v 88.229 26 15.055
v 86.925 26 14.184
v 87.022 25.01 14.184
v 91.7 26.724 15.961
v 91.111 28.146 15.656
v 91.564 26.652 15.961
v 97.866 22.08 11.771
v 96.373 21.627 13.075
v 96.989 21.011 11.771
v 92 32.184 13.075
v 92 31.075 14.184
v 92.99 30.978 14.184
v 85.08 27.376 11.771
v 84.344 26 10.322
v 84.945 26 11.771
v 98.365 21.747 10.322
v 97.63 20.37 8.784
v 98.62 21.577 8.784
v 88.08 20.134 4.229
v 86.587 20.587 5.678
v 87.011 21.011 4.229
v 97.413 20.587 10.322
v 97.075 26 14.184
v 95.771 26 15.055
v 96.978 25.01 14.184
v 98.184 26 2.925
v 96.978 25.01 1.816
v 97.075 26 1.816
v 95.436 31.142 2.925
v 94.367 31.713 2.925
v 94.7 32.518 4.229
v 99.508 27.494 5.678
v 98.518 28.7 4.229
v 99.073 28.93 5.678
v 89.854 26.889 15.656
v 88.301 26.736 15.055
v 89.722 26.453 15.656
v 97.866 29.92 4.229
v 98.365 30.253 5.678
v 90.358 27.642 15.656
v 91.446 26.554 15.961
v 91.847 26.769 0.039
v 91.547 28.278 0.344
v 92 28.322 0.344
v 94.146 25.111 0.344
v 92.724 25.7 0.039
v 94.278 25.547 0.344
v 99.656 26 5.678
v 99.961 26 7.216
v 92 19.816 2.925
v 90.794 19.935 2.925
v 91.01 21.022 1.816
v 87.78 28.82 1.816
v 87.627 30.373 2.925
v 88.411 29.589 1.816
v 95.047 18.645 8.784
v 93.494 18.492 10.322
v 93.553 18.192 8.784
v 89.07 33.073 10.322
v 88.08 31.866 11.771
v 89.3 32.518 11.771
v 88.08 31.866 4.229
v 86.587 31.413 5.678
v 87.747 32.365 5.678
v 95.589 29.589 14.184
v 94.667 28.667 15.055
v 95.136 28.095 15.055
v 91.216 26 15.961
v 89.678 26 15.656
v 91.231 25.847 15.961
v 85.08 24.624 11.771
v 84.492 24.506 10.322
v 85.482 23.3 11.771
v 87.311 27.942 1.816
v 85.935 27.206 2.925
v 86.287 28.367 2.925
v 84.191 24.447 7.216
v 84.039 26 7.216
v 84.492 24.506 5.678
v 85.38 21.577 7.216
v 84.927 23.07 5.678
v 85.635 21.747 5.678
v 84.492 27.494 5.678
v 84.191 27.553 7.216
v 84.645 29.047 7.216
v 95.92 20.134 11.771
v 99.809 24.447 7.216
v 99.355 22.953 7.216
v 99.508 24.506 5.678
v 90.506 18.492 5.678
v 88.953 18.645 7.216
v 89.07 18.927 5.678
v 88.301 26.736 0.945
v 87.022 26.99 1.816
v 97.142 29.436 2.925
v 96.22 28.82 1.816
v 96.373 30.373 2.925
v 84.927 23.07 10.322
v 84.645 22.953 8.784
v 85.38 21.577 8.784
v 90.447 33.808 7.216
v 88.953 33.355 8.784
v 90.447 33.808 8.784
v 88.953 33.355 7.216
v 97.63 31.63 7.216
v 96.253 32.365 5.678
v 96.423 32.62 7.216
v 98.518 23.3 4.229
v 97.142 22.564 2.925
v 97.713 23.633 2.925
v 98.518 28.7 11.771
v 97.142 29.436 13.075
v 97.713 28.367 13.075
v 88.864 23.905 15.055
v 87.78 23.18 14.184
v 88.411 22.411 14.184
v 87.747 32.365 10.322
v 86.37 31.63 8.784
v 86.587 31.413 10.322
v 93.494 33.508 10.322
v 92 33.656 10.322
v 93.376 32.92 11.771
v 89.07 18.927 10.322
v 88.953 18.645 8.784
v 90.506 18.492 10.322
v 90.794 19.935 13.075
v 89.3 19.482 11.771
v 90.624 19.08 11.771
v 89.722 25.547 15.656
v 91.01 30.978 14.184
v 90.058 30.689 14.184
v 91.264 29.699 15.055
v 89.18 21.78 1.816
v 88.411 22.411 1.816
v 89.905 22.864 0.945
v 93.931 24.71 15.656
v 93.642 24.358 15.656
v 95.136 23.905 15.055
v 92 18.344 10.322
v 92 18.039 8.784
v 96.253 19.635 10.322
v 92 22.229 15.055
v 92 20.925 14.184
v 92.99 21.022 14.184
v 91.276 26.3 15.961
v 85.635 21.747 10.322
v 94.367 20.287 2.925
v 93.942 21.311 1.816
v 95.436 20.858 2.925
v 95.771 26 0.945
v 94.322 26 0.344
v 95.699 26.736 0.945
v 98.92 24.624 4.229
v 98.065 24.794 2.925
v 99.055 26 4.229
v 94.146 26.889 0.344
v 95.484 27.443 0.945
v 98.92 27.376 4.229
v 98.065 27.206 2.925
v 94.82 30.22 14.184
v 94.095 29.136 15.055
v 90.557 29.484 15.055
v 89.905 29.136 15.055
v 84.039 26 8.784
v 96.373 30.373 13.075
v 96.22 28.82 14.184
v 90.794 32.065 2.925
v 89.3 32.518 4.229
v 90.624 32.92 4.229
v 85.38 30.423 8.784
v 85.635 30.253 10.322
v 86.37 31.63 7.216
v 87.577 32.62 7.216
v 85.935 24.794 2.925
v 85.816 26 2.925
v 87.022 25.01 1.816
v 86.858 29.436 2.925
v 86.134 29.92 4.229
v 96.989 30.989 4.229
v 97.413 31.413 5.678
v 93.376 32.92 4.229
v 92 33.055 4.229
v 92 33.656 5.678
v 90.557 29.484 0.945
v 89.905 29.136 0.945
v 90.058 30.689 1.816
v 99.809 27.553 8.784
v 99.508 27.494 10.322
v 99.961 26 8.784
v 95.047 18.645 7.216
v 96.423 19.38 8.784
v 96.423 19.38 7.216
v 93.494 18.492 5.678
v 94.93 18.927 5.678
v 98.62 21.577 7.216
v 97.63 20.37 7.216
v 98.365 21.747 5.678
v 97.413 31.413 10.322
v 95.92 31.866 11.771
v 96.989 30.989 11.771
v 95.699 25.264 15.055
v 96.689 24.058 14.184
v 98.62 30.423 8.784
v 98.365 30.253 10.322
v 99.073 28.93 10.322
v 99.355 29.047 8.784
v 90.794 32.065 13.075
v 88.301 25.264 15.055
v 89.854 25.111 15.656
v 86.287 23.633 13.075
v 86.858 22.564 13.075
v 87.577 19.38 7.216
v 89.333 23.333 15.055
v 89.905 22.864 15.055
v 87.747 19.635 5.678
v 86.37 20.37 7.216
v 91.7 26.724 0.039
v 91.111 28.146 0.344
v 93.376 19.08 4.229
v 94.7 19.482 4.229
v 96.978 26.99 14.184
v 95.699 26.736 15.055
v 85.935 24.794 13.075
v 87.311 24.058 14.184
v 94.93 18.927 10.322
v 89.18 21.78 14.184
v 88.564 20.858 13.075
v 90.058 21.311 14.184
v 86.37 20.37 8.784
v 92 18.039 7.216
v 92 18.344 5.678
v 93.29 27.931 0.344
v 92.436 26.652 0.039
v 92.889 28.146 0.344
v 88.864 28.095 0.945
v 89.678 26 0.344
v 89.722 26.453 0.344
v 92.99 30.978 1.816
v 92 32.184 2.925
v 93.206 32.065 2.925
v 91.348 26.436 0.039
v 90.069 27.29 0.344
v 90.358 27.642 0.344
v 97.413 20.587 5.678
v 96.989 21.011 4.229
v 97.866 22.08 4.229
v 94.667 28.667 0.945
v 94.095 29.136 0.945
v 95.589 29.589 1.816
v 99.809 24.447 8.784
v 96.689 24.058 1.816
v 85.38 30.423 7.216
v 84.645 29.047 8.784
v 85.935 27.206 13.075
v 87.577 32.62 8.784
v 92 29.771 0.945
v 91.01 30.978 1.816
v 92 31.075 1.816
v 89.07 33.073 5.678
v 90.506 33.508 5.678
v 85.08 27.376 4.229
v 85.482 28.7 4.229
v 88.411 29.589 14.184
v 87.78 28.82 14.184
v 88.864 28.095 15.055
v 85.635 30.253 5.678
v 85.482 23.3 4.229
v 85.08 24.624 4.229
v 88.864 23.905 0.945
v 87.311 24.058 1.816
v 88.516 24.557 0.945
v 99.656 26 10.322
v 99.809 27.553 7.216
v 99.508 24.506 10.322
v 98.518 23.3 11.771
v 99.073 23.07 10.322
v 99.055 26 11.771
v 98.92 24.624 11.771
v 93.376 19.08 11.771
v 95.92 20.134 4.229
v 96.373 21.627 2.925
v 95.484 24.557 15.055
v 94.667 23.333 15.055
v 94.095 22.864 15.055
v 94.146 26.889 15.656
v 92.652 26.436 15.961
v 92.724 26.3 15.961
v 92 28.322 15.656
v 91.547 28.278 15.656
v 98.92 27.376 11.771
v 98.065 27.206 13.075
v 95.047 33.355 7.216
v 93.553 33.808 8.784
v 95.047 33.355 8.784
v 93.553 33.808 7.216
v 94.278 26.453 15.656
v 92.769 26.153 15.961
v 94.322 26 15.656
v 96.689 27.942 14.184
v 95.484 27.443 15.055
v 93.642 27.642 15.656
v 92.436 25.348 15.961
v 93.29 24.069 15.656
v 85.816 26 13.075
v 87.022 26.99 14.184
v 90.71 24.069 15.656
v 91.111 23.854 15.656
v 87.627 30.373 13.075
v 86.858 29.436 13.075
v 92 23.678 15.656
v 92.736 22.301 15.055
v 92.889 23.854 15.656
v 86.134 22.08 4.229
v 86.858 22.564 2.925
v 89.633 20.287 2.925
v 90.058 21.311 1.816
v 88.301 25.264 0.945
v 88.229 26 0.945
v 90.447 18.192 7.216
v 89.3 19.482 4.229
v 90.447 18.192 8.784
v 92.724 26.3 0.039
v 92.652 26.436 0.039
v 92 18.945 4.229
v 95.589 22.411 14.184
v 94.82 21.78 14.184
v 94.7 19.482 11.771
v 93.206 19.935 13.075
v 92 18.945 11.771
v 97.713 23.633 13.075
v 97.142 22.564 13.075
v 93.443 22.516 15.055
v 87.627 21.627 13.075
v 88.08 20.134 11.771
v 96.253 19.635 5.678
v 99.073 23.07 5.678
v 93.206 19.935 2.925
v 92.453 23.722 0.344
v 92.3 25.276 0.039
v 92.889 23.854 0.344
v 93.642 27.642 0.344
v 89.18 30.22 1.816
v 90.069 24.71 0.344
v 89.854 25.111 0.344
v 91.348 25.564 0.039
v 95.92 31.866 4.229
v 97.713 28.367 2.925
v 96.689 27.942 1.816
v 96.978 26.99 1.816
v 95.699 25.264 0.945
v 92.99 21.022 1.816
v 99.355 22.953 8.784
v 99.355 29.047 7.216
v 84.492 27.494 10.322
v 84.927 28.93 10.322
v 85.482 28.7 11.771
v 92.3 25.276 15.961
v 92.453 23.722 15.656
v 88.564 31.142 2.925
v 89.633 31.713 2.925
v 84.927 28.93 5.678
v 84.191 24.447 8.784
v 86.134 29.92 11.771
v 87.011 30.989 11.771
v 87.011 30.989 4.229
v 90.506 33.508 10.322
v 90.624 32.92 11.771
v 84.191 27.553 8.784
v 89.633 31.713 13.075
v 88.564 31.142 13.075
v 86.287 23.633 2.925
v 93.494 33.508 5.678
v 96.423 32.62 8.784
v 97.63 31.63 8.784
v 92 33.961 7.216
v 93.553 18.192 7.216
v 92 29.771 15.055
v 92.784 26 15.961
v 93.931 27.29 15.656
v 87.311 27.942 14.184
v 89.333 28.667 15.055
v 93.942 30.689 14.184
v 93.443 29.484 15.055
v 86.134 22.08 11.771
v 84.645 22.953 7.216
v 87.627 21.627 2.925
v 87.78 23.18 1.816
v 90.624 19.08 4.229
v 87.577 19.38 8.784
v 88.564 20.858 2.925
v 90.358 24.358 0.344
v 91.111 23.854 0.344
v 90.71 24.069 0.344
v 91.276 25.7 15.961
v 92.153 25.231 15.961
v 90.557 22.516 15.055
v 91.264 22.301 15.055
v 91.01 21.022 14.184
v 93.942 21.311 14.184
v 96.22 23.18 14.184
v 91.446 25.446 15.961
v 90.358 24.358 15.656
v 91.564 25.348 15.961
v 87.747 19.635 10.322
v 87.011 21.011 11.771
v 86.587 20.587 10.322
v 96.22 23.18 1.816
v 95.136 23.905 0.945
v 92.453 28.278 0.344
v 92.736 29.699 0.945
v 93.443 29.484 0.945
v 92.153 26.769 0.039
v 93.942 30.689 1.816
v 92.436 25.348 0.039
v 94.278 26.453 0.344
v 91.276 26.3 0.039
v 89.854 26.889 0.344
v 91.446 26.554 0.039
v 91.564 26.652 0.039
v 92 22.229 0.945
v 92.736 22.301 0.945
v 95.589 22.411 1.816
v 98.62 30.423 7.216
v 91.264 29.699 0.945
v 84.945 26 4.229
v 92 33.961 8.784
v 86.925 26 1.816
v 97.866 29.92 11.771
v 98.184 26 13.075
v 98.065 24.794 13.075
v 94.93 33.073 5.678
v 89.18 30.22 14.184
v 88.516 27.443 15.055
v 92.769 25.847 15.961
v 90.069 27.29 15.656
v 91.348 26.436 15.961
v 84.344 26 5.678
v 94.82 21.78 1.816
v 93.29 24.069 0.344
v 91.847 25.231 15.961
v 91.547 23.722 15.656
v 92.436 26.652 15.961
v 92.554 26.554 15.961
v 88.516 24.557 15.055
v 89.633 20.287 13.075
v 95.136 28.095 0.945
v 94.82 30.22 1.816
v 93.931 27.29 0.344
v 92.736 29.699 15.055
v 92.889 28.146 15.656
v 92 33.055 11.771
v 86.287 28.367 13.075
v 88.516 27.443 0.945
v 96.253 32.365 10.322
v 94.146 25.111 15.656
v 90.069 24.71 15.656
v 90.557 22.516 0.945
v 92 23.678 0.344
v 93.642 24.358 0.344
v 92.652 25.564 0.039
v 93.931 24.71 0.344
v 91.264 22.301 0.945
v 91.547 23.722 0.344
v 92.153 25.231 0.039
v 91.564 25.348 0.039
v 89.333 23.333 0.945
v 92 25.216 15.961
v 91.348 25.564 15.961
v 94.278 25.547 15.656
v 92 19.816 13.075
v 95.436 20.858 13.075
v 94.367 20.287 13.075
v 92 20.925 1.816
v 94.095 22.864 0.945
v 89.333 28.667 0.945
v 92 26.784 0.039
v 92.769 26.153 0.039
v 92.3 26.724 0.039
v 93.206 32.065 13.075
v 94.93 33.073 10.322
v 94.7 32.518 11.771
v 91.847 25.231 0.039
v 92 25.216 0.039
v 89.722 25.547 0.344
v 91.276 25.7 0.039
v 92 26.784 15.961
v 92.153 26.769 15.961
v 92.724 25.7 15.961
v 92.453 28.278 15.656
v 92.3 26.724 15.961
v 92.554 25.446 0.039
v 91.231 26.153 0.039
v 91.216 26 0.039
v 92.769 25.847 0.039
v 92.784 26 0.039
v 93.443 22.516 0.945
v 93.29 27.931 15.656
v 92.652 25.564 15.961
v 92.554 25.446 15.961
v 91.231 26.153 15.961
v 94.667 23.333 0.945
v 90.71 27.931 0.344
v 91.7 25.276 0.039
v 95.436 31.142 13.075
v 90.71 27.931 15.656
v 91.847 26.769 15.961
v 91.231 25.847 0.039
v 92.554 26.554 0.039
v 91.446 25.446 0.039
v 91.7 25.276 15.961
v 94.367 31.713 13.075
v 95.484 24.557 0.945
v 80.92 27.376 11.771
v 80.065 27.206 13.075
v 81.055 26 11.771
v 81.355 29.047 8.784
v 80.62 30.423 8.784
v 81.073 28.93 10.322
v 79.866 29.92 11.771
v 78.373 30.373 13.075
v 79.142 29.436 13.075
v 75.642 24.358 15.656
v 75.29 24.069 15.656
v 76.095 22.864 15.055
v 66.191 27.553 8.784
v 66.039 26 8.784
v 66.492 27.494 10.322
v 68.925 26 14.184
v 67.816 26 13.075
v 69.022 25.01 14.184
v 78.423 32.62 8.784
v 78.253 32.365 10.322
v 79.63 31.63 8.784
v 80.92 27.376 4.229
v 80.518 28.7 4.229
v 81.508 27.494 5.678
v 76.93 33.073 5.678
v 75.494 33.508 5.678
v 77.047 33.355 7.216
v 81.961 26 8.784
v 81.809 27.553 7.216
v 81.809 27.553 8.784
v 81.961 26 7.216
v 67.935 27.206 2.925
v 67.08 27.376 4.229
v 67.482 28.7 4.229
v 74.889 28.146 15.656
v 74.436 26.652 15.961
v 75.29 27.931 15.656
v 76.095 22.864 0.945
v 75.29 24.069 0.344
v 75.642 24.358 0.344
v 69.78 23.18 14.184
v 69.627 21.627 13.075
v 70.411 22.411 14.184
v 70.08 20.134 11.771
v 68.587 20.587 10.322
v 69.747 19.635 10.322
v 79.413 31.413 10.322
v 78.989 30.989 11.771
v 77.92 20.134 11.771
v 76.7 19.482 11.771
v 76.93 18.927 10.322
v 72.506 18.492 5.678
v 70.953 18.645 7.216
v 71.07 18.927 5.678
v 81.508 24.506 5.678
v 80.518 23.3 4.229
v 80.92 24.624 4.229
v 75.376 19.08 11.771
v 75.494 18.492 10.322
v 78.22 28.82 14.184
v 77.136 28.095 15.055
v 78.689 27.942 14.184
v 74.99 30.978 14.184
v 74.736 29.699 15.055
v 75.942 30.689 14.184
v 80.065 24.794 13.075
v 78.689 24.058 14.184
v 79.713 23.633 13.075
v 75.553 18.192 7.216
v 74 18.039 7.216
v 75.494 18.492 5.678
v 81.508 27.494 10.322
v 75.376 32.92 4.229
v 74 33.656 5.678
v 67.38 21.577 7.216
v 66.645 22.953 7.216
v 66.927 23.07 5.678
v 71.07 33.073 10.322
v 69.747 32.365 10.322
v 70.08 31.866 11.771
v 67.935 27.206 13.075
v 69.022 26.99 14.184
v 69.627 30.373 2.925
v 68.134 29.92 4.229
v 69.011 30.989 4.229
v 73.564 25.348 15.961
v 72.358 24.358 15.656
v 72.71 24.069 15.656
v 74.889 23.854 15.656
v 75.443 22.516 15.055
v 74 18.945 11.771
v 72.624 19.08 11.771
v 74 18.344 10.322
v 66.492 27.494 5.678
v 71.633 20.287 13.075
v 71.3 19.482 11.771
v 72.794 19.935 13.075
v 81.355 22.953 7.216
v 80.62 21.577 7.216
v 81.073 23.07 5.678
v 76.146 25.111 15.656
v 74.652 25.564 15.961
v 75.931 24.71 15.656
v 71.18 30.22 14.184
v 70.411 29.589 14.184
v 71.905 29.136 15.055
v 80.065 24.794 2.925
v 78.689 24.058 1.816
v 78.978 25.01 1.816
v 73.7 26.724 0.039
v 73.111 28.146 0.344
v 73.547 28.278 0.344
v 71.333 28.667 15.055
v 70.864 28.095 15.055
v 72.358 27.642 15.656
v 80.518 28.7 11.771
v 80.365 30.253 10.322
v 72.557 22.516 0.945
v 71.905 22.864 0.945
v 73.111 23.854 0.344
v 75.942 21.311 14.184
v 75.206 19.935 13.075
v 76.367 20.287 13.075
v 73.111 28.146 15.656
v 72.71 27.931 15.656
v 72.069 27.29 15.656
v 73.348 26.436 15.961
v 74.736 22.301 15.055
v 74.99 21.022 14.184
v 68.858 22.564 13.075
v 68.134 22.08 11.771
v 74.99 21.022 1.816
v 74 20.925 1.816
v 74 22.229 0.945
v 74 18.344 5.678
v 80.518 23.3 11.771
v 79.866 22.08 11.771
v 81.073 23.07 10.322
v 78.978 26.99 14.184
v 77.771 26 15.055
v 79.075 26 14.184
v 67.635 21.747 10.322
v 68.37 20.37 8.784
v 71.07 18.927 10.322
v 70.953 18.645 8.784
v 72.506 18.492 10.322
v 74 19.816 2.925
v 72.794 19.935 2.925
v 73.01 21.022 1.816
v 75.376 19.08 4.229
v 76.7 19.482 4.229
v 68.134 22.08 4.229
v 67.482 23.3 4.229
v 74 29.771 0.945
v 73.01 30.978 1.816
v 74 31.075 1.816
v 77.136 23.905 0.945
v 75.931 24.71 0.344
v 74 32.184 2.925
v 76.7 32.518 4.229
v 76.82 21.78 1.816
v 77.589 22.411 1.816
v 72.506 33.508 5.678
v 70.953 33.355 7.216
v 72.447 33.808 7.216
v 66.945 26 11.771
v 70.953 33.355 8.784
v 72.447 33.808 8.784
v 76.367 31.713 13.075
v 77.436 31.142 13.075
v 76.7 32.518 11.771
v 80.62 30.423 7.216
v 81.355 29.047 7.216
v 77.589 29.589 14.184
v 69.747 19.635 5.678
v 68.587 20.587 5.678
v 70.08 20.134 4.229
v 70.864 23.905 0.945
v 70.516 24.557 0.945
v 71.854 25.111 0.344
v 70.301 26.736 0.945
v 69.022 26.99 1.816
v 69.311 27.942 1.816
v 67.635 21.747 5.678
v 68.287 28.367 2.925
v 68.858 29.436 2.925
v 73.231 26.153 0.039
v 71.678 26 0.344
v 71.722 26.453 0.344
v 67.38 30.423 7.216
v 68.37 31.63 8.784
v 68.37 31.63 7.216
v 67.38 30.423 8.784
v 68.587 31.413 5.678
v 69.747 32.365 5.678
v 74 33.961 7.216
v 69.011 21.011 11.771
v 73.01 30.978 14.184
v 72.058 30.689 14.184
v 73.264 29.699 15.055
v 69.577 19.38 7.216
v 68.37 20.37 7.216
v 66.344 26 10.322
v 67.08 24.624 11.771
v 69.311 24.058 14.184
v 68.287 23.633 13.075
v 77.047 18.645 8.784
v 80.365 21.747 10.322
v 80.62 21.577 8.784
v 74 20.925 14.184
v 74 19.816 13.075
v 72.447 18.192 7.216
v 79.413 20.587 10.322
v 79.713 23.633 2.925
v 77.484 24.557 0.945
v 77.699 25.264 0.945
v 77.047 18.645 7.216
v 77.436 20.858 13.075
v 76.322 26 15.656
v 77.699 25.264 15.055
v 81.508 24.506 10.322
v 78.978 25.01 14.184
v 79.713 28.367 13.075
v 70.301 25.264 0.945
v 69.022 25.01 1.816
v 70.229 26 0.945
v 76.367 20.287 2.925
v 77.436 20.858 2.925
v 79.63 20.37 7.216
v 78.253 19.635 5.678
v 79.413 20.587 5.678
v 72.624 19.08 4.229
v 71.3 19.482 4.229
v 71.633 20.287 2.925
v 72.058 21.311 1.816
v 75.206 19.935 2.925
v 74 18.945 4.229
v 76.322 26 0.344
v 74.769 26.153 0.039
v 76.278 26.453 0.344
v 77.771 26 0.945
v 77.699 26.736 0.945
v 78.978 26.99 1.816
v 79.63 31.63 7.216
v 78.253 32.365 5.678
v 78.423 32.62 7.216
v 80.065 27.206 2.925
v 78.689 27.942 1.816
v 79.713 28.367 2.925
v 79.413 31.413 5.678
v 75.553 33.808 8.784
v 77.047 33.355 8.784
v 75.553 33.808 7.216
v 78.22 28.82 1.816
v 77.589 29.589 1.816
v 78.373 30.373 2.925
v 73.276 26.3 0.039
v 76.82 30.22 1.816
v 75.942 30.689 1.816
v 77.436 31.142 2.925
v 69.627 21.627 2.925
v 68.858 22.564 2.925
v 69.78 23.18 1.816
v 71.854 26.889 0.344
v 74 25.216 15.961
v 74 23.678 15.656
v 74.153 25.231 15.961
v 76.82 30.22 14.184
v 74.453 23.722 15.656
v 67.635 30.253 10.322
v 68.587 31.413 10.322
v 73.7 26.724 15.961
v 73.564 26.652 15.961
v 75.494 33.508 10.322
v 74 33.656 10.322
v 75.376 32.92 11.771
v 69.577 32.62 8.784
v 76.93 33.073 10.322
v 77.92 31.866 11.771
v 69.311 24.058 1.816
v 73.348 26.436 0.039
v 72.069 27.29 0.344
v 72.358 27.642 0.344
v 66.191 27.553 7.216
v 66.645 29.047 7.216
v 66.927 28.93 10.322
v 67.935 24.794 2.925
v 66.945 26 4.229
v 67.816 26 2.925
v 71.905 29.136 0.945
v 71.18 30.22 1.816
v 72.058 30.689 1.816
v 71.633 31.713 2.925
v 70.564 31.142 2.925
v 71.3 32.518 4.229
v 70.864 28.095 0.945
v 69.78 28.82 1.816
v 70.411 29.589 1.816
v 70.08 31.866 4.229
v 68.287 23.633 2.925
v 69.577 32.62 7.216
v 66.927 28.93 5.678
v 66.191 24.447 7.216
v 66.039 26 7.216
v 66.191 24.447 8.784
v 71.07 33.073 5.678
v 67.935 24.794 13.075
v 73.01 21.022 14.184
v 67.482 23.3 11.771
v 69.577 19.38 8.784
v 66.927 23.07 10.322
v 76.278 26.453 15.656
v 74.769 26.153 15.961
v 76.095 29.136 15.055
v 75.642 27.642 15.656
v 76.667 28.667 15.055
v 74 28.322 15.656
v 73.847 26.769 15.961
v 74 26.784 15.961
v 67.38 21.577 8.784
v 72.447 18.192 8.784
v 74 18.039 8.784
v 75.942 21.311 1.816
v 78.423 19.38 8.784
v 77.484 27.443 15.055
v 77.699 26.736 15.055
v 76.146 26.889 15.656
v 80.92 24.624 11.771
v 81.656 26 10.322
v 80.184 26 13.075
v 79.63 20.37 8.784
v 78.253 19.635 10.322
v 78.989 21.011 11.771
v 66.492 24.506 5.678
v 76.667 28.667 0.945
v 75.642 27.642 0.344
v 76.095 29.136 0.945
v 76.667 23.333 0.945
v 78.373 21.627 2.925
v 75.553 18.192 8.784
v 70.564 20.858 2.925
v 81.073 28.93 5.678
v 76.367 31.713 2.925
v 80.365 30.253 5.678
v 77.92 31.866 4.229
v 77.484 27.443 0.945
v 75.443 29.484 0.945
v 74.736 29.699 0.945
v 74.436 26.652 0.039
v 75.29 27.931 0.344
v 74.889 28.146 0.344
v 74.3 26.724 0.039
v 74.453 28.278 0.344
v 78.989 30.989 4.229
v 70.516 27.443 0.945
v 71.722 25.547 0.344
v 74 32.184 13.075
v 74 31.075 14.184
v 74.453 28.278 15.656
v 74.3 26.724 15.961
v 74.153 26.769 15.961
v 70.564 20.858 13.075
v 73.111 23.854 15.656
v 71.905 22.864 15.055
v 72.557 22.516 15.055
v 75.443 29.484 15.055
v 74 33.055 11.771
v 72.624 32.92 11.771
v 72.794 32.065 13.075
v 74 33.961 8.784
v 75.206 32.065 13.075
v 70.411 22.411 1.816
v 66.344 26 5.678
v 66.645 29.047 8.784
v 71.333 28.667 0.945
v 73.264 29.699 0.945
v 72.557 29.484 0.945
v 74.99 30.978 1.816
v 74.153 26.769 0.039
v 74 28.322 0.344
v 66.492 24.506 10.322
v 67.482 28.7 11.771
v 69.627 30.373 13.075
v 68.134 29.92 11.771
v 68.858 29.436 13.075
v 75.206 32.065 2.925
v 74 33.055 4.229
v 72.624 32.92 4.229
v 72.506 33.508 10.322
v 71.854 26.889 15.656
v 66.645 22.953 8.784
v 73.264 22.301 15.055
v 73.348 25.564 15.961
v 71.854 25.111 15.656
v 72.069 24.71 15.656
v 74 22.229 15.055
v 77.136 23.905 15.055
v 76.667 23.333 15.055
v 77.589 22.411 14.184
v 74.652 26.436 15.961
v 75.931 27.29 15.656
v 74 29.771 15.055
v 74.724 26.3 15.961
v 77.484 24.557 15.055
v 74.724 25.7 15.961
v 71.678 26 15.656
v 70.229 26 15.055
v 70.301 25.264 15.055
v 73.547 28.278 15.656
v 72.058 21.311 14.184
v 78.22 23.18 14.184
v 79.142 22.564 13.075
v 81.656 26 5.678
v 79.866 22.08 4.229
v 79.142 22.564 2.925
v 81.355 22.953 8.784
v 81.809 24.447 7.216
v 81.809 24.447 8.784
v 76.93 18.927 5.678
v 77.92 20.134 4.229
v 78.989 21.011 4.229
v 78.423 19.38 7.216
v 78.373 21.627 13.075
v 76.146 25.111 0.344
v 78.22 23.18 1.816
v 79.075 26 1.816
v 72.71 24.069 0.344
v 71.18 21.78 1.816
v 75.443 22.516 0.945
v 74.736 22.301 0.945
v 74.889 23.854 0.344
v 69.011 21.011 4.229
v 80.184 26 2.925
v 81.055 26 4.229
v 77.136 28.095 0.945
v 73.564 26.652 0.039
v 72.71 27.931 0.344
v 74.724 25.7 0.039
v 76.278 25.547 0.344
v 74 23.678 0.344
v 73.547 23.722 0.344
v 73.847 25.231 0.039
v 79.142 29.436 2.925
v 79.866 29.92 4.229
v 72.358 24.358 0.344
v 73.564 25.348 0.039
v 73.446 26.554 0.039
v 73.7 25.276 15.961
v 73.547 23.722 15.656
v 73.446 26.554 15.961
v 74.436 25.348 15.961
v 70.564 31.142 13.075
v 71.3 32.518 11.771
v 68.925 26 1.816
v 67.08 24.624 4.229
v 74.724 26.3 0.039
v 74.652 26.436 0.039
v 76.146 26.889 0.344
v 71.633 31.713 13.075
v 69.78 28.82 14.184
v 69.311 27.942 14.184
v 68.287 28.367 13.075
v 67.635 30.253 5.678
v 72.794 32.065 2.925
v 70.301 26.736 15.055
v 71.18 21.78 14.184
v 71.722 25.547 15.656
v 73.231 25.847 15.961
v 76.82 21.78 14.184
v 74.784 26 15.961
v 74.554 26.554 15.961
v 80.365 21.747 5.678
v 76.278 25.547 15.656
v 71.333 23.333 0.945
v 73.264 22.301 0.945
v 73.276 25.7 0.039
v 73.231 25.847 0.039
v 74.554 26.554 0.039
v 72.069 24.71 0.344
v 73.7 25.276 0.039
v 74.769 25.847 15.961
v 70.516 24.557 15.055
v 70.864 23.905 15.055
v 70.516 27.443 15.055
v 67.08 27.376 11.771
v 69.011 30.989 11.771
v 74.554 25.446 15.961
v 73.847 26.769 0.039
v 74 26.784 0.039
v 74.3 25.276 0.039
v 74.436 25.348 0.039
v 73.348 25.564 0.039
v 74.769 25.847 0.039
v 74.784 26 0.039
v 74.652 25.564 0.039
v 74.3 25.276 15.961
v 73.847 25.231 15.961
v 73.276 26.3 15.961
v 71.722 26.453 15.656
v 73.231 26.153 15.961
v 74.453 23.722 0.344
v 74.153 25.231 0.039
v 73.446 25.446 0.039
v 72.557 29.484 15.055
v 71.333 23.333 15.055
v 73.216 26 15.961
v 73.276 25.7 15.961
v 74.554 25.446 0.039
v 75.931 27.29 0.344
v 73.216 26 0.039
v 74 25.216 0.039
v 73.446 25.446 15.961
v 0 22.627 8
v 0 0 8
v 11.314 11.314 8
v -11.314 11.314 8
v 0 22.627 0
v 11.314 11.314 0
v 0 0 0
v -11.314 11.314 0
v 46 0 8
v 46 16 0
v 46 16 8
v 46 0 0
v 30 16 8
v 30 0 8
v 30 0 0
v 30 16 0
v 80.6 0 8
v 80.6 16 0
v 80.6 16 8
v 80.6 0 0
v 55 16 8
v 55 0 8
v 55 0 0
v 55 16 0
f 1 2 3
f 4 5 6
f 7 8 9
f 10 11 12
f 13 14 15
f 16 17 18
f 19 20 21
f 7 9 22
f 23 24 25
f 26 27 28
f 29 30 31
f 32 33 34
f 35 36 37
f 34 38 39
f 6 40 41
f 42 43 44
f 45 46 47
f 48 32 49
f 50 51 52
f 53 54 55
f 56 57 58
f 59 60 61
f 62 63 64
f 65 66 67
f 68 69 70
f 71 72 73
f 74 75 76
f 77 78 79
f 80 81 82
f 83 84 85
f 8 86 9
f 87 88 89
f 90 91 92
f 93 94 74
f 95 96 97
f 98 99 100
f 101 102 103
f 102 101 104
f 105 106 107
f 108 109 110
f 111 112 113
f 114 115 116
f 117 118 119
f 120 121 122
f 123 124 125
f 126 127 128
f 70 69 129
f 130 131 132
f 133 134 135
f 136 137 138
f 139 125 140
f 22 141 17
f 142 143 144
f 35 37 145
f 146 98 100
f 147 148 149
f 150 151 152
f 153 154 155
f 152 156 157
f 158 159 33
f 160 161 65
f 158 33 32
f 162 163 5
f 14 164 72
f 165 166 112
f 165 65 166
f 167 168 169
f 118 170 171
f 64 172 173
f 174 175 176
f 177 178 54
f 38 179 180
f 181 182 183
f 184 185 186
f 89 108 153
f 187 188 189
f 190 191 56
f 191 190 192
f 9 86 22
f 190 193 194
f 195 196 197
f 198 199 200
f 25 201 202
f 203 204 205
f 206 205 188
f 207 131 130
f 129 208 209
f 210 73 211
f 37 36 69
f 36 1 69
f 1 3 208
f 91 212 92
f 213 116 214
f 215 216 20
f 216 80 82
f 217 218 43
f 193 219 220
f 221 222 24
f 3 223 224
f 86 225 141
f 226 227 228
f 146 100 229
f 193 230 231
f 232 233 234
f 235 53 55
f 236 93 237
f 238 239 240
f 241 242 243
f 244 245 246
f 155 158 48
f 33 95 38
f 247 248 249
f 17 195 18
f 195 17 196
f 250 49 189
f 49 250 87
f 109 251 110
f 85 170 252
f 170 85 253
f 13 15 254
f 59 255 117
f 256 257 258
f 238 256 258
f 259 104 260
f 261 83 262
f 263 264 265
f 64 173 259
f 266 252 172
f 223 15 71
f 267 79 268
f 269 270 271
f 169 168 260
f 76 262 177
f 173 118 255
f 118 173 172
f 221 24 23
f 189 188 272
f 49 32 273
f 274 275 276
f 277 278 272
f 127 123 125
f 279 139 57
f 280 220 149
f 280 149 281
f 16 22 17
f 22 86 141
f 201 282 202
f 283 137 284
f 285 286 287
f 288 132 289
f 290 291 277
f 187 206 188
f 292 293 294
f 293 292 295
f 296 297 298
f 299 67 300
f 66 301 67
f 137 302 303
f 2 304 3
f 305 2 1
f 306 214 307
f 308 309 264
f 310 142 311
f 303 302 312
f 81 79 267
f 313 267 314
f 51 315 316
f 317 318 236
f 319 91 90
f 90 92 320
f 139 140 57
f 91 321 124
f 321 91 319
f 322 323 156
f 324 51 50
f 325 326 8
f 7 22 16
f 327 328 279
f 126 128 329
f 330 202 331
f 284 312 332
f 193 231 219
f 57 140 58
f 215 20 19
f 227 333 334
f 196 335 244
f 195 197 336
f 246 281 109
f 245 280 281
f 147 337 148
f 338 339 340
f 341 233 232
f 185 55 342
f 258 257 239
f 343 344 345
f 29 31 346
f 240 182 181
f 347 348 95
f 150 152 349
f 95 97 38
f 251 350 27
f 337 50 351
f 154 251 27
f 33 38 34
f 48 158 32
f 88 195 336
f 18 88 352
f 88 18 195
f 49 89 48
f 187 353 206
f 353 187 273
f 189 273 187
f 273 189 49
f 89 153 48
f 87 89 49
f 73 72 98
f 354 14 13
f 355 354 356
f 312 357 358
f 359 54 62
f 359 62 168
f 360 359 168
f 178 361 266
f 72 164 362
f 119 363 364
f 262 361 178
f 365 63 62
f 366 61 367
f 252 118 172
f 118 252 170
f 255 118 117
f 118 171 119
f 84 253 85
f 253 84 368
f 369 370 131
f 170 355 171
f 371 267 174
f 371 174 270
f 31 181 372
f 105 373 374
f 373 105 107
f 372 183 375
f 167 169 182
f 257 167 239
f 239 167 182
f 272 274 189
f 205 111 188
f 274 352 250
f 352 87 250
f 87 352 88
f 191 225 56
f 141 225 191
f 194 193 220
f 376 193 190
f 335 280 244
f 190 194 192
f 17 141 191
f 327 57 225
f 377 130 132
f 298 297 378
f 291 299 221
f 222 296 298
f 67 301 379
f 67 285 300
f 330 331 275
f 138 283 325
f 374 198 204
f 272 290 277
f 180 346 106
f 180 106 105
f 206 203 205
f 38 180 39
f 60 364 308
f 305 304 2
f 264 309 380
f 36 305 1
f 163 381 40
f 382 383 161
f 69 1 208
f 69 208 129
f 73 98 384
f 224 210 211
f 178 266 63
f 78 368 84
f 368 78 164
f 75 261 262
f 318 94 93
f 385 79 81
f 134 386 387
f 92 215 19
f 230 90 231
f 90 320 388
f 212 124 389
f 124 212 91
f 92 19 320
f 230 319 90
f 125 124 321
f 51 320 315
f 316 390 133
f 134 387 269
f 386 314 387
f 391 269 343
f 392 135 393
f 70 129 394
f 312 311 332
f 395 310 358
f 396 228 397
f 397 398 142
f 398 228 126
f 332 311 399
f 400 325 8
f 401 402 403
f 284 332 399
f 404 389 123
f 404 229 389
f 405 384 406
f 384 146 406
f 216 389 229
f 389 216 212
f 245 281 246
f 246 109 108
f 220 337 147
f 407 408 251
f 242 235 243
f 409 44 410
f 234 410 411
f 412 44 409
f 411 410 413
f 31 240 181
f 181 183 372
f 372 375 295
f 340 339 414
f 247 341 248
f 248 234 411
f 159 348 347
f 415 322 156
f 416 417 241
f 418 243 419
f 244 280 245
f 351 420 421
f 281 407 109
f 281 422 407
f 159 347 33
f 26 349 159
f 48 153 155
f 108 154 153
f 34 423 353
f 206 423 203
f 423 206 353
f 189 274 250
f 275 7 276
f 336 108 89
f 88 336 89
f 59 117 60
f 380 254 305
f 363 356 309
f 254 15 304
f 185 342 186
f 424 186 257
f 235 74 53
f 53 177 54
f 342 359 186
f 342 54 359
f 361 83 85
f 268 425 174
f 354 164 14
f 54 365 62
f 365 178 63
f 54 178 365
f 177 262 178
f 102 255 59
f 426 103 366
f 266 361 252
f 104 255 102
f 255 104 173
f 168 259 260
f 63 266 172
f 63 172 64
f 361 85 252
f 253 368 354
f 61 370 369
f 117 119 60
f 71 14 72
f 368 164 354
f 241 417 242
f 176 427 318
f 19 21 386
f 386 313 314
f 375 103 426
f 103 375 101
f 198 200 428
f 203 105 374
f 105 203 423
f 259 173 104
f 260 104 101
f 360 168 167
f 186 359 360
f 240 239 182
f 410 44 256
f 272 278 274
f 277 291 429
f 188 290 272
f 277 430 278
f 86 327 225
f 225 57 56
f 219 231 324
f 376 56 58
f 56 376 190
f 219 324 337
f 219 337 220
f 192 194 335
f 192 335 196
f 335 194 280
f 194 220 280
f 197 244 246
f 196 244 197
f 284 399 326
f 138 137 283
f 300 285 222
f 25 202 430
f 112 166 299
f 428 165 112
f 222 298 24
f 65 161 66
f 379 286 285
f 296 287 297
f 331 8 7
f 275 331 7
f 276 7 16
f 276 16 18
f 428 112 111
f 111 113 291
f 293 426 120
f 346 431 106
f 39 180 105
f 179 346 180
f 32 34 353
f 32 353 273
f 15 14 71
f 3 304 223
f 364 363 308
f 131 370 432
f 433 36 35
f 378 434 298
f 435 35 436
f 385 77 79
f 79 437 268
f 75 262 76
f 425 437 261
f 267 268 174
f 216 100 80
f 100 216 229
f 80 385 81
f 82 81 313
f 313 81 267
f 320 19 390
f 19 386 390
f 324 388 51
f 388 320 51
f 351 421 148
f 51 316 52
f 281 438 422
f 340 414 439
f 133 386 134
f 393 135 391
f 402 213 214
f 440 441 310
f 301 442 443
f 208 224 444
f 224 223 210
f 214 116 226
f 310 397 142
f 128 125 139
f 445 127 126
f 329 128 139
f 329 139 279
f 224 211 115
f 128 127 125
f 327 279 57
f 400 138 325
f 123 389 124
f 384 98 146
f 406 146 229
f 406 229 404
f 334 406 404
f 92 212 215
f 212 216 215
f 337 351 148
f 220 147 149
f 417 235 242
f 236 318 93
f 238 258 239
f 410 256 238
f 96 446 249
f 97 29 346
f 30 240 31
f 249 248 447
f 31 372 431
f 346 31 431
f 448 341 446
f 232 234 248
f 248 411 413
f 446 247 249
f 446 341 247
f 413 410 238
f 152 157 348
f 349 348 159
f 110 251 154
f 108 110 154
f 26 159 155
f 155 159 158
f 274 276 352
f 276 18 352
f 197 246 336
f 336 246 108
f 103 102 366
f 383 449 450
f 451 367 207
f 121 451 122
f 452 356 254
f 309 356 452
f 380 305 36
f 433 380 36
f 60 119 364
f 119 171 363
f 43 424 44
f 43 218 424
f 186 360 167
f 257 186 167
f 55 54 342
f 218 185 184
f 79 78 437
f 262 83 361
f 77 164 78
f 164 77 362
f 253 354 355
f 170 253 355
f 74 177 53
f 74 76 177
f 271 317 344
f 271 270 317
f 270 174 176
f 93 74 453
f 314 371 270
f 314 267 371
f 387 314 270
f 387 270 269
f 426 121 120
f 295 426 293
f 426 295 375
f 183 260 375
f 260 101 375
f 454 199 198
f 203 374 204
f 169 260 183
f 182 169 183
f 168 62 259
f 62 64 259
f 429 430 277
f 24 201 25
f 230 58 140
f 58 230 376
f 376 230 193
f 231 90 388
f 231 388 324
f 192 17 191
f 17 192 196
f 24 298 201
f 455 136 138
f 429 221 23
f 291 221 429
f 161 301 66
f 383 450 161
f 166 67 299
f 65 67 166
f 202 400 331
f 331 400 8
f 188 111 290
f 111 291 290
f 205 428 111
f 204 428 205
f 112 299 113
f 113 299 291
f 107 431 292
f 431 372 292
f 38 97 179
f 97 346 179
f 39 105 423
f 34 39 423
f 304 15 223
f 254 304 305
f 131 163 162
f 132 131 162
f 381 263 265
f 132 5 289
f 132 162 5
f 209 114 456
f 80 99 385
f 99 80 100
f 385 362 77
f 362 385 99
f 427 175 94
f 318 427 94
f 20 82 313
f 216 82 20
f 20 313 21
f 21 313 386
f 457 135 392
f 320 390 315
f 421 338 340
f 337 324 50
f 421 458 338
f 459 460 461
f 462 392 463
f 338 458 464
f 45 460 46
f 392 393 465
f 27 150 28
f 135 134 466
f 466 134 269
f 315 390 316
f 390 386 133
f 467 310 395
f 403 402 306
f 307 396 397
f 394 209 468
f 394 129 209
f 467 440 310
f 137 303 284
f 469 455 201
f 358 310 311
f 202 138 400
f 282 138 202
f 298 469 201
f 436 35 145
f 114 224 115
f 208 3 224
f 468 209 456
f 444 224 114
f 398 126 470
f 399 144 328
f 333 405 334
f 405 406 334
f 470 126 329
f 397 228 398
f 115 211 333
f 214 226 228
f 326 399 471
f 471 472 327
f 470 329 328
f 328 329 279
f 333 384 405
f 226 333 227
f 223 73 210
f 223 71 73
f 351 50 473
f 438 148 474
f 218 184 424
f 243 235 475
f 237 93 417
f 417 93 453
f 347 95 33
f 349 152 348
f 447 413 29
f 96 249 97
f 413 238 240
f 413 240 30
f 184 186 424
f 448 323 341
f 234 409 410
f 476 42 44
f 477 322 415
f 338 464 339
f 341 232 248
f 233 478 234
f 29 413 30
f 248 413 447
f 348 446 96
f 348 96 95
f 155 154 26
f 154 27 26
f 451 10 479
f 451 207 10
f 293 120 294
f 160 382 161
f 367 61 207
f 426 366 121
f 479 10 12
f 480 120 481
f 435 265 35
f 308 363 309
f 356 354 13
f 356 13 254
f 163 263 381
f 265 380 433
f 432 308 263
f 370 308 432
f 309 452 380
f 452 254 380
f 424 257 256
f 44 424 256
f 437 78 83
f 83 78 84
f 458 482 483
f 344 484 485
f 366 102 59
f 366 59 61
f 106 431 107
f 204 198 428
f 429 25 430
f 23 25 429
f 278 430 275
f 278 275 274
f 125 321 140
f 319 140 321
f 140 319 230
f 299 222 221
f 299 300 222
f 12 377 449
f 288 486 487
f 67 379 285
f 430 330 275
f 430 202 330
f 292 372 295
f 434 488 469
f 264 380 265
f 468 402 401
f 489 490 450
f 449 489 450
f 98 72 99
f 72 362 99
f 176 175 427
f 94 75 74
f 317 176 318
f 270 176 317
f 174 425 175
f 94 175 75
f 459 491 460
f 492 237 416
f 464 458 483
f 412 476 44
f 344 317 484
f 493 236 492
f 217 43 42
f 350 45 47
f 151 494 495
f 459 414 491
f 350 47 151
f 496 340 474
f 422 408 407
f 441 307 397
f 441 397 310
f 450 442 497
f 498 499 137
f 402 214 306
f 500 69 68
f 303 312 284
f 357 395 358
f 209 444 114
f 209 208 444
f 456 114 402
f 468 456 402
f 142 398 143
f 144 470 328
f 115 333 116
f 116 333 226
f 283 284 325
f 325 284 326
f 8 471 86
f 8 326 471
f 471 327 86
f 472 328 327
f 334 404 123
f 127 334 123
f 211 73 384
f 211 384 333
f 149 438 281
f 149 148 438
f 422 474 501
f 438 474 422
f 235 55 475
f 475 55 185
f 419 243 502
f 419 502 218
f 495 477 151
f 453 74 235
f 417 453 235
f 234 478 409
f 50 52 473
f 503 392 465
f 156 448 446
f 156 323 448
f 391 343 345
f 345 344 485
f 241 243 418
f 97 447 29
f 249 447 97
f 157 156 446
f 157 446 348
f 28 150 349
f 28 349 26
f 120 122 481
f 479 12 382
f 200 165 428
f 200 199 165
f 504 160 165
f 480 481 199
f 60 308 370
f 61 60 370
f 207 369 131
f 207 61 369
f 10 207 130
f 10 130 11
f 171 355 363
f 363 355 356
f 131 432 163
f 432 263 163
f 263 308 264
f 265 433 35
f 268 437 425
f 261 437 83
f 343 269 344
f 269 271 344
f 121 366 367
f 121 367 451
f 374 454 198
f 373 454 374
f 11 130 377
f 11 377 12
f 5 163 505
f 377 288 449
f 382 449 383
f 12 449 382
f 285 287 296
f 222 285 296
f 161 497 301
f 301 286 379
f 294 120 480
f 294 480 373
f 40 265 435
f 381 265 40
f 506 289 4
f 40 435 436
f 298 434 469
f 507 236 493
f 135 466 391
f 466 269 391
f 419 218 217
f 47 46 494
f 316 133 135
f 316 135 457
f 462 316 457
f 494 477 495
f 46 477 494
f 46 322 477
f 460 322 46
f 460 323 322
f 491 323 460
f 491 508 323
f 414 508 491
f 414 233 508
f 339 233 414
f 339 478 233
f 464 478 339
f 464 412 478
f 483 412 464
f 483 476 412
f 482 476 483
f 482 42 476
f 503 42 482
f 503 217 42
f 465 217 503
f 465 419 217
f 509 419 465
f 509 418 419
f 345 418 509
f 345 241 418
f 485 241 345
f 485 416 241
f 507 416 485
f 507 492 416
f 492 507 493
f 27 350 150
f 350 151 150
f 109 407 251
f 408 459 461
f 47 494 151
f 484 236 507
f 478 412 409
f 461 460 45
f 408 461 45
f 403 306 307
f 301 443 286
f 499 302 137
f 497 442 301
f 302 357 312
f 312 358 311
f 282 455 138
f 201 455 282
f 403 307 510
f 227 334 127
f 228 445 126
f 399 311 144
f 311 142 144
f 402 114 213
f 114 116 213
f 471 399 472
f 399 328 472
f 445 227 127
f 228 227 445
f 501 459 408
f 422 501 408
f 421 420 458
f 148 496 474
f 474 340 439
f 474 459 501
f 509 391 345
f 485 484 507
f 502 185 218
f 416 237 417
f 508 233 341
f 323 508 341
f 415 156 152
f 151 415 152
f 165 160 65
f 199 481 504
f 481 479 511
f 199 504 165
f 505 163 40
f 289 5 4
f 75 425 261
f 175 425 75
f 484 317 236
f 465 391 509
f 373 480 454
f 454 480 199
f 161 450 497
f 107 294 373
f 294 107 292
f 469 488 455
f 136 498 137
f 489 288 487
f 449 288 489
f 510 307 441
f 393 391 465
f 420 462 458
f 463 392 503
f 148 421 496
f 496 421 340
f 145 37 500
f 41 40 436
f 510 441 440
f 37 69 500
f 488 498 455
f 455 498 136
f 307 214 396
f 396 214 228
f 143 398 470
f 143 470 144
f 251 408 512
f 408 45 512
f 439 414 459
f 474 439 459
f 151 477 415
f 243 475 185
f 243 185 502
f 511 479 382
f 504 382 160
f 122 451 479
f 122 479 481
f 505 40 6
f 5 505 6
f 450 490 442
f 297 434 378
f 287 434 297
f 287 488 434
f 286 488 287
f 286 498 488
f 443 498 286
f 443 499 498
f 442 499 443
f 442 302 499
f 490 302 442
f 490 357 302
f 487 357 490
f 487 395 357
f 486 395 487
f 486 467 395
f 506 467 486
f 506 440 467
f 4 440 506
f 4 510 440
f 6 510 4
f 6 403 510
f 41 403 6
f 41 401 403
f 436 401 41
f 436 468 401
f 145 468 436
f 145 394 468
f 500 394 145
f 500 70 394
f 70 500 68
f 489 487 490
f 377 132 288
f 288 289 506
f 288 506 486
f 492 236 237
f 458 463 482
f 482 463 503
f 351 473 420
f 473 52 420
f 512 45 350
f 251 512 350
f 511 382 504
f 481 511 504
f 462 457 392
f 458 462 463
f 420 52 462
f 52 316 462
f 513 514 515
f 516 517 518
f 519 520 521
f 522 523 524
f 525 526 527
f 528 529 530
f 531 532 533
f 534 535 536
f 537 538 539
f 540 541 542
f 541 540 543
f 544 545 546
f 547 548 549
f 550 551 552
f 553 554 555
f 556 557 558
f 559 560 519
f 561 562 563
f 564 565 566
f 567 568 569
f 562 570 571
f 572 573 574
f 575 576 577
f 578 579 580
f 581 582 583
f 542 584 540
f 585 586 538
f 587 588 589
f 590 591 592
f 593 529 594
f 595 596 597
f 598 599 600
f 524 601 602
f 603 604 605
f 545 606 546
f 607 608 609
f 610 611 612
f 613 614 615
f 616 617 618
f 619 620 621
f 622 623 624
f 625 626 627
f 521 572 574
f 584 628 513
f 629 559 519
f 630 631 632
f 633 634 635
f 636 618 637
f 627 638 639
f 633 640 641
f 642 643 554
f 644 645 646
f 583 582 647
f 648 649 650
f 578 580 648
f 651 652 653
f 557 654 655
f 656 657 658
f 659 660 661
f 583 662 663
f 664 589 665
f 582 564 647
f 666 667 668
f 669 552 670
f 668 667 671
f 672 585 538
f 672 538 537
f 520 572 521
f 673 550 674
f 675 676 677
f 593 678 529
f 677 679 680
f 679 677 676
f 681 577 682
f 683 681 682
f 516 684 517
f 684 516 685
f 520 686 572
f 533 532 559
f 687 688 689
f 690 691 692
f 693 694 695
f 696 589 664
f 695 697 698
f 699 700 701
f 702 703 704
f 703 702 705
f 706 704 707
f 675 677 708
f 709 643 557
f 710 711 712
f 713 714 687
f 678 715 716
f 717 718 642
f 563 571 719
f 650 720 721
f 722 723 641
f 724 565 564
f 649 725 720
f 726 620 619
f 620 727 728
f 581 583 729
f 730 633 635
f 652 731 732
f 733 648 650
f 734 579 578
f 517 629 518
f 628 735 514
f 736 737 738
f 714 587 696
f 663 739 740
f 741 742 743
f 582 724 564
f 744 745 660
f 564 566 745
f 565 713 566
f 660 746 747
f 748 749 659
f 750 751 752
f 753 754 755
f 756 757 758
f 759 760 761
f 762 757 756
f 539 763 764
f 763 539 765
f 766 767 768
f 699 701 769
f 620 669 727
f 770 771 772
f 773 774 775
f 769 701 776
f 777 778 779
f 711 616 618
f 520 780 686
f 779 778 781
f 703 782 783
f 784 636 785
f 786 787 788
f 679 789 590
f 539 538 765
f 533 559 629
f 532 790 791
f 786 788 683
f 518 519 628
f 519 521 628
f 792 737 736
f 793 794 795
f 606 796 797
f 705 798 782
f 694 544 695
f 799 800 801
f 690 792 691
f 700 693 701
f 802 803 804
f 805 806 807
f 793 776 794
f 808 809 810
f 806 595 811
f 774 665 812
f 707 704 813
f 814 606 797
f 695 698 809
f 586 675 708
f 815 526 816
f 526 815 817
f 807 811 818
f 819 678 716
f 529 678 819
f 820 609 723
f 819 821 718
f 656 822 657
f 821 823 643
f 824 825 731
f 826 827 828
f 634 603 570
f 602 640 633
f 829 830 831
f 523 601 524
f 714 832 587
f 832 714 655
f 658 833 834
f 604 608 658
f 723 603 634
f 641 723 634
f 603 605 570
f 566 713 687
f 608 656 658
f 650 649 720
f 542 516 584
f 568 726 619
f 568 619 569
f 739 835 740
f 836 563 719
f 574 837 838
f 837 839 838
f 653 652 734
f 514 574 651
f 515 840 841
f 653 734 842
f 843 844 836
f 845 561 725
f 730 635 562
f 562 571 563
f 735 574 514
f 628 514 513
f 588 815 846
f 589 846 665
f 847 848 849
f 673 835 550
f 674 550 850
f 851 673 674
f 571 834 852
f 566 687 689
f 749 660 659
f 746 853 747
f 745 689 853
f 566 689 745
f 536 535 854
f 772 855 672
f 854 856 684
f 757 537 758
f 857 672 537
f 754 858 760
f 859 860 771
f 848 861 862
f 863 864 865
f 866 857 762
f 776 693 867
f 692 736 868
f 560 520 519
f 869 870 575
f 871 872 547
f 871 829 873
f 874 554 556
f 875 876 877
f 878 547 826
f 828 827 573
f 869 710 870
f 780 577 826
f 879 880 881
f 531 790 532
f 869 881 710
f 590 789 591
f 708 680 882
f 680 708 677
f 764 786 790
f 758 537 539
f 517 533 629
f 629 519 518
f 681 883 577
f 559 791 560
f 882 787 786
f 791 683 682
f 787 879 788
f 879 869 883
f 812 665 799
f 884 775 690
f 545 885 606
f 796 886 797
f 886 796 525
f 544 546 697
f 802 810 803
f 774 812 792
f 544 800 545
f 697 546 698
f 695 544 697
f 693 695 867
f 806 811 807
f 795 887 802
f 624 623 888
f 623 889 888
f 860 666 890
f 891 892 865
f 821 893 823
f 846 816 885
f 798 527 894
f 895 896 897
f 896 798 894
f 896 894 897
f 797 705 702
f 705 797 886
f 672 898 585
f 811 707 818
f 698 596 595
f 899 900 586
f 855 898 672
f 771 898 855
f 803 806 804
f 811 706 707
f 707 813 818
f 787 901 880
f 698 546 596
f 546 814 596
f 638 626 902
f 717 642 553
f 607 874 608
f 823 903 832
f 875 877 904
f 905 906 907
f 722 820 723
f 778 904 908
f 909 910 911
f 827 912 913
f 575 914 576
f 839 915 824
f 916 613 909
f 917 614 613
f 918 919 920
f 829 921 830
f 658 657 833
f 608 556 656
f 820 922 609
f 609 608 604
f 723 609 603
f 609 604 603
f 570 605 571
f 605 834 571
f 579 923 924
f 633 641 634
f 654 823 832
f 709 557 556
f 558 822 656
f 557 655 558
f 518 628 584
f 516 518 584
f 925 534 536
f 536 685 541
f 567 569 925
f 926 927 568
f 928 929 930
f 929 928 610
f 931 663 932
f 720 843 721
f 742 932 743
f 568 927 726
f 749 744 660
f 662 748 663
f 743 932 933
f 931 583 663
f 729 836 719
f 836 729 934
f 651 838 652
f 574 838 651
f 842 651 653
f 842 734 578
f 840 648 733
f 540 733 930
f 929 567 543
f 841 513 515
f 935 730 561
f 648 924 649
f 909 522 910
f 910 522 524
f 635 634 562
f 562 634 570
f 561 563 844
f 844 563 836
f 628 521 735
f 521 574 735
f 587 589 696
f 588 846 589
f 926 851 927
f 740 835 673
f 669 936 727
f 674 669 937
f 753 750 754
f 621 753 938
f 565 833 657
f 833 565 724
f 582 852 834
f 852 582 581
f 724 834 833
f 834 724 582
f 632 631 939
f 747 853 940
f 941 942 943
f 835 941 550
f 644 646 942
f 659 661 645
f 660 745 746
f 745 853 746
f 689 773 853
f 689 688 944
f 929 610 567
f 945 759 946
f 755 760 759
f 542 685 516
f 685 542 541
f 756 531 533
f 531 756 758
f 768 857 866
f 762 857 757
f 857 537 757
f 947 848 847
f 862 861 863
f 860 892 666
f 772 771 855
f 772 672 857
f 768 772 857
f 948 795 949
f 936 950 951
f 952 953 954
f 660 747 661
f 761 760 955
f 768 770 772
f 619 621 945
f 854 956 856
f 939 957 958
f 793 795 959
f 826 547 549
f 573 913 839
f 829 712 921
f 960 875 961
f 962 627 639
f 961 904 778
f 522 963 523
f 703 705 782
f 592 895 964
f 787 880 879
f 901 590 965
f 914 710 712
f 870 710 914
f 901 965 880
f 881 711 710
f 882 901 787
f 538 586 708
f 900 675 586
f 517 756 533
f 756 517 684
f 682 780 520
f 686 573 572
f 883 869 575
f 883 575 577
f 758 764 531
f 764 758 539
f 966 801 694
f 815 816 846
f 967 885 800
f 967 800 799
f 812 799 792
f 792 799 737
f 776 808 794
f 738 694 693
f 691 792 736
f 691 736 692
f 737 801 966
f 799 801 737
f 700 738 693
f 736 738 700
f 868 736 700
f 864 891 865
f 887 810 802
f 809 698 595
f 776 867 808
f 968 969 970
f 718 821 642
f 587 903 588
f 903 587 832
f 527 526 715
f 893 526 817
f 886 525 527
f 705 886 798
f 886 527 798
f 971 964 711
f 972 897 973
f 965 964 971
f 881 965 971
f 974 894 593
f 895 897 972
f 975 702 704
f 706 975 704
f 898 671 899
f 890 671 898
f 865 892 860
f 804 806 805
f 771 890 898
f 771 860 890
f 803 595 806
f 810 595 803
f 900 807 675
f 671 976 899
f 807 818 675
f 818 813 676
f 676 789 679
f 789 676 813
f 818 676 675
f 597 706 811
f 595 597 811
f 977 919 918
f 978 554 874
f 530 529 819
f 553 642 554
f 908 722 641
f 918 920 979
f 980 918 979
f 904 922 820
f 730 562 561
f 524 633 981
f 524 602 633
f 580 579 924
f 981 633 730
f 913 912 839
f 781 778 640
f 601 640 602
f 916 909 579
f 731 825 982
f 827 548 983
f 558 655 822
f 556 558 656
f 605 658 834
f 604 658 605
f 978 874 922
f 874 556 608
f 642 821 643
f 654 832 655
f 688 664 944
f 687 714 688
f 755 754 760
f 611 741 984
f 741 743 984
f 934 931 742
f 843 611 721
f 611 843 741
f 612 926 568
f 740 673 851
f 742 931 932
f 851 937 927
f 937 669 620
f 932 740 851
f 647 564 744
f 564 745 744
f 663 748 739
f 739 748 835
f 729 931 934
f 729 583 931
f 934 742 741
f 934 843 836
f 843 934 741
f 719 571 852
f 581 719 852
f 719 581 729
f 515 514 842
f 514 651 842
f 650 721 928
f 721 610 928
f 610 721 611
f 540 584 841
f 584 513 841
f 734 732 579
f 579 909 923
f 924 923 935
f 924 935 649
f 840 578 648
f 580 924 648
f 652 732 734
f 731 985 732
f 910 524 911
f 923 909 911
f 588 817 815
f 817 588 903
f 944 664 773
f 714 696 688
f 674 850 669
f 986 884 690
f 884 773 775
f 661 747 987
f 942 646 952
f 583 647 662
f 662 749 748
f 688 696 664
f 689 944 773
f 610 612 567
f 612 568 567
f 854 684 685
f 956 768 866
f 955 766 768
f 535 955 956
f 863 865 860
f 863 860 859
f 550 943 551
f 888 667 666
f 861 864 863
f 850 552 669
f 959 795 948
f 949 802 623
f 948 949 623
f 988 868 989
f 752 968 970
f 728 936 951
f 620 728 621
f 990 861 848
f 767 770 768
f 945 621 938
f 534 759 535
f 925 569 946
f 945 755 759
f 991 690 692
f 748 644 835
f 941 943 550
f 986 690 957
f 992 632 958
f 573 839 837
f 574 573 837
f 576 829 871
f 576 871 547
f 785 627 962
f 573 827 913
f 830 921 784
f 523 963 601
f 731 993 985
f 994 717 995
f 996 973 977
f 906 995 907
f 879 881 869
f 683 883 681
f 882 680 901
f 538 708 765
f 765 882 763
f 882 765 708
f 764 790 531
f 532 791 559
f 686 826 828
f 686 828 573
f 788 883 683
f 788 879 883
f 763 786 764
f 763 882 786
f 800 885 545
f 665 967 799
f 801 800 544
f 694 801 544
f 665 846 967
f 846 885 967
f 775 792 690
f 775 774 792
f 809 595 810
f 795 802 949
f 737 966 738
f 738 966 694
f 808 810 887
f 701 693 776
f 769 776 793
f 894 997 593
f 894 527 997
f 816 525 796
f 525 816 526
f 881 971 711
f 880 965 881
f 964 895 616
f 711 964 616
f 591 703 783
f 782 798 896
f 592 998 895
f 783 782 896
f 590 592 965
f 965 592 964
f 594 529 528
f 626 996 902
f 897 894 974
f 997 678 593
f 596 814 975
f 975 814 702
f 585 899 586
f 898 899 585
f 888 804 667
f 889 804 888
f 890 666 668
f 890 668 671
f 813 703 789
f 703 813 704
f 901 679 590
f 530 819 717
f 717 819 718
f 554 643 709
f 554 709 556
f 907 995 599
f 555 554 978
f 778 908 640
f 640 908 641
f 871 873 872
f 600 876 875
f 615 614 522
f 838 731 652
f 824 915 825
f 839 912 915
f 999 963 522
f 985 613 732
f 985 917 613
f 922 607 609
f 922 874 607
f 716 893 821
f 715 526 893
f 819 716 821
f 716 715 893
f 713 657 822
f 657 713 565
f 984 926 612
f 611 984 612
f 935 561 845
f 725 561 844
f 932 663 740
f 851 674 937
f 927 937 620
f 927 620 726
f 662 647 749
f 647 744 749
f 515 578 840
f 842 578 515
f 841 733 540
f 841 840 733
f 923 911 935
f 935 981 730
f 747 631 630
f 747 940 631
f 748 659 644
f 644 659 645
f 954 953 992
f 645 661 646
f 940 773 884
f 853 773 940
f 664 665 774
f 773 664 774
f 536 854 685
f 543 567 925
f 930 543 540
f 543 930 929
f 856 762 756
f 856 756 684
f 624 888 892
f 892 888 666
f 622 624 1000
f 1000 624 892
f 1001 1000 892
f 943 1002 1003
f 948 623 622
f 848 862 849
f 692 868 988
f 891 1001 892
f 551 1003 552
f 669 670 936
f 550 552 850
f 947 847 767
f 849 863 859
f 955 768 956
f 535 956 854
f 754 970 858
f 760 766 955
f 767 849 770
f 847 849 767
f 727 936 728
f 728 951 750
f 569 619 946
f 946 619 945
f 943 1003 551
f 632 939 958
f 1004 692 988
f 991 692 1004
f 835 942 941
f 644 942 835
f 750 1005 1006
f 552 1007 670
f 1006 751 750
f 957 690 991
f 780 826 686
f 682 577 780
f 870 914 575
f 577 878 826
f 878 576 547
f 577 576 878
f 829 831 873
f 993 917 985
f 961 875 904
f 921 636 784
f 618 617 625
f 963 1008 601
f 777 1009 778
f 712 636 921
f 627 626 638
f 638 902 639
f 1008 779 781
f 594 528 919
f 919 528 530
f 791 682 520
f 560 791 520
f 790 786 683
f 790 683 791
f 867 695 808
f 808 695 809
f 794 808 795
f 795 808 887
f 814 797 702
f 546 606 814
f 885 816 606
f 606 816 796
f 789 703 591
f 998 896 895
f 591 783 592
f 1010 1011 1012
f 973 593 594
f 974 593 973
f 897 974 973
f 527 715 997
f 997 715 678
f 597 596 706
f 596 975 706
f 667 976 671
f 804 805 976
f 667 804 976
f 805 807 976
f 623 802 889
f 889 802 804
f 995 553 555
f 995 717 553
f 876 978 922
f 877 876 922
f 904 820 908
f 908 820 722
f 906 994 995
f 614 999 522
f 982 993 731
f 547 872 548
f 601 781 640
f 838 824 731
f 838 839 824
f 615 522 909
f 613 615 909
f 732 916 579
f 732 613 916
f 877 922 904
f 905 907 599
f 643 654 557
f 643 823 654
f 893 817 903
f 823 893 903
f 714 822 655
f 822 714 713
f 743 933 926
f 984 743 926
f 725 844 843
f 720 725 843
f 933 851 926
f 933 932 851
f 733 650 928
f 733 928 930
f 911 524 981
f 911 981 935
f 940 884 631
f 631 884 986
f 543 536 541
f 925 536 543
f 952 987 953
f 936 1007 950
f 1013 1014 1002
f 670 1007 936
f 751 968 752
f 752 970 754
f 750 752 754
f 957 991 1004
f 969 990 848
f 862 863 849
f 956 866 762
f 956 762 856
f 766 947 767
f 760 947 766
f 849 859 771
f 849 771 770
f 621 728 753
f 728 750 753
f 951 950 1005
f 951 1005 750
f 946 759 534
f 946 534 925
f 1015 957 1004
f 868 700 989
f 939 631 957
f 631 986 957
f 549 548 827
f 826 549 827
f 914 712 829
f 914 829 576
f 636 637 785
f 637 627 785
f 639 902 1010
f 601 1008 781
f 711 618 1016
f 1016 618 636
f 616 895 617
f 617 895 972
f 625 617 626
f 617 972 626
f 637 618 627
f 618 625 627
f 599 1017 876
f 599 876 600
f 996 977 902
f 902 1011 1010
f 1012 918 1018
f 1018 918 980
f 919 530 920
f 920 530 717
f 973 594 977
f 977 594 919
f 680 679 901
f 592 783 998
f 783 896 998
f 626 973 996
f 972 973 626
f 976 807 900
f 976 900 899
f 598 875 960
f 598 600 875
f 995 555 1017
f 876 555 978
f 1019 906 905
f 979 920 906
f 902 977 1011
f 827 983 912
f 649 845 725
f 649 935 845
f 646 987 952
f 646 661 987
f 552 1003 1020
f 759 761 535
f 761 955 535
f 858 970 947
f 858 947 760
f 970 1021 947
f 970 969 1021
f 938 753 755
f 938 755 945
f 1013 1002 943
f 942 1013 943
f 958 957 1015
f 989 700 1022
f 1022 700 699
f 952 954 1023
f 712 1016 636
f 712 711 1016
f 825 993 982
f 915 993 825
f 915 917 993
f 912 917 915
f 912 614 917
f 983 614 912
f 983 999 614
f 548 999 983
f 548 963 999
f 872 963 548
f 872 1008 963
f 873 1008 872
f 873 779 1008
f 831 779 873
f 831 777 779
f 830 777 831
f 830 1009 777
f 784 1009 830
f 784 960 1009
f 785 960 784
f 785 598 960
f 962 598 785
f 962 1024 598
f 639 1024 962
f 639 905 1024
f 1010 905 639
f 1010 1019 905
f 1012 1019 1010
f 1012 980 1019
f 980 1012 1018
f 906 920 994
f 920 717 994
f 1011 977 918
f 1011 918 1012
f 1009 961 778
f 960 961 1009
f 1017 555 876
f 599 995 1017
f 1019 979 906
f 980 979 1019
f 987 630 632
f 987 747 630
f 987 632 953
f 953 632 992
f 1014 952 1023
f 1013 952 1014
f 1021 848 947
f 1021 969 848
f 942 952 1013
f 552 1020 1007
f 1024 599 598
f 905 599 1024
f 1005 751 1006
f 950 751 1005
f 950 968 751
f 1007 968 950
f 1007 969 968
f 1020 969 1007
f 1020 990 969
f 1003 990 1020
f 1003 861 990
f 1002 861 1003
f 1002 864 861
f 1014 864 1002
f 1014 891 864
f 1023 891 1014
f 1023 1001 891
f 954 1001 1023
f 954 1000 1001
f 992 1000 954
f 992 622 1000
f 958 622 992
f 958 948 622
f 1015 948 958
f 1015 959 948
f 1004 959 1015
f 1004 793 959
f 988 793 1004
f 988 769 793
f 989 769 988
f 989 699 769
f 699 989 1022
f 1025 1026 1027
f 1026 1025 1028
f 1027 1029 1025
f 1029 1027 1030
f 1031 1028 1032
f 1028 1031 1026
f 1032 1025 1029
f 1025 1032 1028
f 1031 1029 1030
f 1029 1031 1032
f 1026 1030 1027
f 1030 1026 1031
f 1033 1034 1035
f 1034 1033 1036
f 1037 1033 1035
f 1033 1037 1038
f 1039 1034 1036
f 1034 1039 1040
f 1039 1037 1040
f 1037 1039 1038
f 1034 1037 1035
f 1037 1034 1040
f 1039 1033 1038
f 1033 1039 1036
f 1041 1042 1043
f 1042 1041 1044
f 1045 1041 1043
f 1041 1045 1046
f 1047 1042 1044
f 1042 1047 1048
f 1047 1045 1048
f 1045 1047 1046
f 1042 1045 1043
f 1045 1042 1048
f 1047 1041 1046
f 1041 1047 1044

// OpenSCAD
// transforms.scad — moving, turning, stretching, tinting.
// A transformation applies to the shape that follows it.
// Transformations nest: the innermost is applied first.

$fn = 32;

// One red cube, turned 45 degrees around the z axis.
rotate([0, 0, 45])
    color("red")
        cube([16, 16, 8]);

// The same cube twice more: moved, then stretched in x.
translate([30, 0, 0])
    color("green")
        cube([16, 16, 8]);

translate([55, 0, 0])
    scale([1.6, 1, 1])
        color("blue")
            cube([16, 16, 8]);

// A sphere and its mirror image across the x axis.
// mirror() flips everything under it — including the
// direction of the translate inside it — so the copy
// lands 18 to the LEFT of the group origin while the
// original sits at the origin. Watch for that when you
// read the bounding box in chapter 3. The pair sits in
// its own lane (y = 26) so nothing else interferes.
translate([92, 26, 8]) {
    sphere(r = 8);
    mirror([1, 0, 0])
        translate([18, 0, 0])
            sphere(r = 8);
}
